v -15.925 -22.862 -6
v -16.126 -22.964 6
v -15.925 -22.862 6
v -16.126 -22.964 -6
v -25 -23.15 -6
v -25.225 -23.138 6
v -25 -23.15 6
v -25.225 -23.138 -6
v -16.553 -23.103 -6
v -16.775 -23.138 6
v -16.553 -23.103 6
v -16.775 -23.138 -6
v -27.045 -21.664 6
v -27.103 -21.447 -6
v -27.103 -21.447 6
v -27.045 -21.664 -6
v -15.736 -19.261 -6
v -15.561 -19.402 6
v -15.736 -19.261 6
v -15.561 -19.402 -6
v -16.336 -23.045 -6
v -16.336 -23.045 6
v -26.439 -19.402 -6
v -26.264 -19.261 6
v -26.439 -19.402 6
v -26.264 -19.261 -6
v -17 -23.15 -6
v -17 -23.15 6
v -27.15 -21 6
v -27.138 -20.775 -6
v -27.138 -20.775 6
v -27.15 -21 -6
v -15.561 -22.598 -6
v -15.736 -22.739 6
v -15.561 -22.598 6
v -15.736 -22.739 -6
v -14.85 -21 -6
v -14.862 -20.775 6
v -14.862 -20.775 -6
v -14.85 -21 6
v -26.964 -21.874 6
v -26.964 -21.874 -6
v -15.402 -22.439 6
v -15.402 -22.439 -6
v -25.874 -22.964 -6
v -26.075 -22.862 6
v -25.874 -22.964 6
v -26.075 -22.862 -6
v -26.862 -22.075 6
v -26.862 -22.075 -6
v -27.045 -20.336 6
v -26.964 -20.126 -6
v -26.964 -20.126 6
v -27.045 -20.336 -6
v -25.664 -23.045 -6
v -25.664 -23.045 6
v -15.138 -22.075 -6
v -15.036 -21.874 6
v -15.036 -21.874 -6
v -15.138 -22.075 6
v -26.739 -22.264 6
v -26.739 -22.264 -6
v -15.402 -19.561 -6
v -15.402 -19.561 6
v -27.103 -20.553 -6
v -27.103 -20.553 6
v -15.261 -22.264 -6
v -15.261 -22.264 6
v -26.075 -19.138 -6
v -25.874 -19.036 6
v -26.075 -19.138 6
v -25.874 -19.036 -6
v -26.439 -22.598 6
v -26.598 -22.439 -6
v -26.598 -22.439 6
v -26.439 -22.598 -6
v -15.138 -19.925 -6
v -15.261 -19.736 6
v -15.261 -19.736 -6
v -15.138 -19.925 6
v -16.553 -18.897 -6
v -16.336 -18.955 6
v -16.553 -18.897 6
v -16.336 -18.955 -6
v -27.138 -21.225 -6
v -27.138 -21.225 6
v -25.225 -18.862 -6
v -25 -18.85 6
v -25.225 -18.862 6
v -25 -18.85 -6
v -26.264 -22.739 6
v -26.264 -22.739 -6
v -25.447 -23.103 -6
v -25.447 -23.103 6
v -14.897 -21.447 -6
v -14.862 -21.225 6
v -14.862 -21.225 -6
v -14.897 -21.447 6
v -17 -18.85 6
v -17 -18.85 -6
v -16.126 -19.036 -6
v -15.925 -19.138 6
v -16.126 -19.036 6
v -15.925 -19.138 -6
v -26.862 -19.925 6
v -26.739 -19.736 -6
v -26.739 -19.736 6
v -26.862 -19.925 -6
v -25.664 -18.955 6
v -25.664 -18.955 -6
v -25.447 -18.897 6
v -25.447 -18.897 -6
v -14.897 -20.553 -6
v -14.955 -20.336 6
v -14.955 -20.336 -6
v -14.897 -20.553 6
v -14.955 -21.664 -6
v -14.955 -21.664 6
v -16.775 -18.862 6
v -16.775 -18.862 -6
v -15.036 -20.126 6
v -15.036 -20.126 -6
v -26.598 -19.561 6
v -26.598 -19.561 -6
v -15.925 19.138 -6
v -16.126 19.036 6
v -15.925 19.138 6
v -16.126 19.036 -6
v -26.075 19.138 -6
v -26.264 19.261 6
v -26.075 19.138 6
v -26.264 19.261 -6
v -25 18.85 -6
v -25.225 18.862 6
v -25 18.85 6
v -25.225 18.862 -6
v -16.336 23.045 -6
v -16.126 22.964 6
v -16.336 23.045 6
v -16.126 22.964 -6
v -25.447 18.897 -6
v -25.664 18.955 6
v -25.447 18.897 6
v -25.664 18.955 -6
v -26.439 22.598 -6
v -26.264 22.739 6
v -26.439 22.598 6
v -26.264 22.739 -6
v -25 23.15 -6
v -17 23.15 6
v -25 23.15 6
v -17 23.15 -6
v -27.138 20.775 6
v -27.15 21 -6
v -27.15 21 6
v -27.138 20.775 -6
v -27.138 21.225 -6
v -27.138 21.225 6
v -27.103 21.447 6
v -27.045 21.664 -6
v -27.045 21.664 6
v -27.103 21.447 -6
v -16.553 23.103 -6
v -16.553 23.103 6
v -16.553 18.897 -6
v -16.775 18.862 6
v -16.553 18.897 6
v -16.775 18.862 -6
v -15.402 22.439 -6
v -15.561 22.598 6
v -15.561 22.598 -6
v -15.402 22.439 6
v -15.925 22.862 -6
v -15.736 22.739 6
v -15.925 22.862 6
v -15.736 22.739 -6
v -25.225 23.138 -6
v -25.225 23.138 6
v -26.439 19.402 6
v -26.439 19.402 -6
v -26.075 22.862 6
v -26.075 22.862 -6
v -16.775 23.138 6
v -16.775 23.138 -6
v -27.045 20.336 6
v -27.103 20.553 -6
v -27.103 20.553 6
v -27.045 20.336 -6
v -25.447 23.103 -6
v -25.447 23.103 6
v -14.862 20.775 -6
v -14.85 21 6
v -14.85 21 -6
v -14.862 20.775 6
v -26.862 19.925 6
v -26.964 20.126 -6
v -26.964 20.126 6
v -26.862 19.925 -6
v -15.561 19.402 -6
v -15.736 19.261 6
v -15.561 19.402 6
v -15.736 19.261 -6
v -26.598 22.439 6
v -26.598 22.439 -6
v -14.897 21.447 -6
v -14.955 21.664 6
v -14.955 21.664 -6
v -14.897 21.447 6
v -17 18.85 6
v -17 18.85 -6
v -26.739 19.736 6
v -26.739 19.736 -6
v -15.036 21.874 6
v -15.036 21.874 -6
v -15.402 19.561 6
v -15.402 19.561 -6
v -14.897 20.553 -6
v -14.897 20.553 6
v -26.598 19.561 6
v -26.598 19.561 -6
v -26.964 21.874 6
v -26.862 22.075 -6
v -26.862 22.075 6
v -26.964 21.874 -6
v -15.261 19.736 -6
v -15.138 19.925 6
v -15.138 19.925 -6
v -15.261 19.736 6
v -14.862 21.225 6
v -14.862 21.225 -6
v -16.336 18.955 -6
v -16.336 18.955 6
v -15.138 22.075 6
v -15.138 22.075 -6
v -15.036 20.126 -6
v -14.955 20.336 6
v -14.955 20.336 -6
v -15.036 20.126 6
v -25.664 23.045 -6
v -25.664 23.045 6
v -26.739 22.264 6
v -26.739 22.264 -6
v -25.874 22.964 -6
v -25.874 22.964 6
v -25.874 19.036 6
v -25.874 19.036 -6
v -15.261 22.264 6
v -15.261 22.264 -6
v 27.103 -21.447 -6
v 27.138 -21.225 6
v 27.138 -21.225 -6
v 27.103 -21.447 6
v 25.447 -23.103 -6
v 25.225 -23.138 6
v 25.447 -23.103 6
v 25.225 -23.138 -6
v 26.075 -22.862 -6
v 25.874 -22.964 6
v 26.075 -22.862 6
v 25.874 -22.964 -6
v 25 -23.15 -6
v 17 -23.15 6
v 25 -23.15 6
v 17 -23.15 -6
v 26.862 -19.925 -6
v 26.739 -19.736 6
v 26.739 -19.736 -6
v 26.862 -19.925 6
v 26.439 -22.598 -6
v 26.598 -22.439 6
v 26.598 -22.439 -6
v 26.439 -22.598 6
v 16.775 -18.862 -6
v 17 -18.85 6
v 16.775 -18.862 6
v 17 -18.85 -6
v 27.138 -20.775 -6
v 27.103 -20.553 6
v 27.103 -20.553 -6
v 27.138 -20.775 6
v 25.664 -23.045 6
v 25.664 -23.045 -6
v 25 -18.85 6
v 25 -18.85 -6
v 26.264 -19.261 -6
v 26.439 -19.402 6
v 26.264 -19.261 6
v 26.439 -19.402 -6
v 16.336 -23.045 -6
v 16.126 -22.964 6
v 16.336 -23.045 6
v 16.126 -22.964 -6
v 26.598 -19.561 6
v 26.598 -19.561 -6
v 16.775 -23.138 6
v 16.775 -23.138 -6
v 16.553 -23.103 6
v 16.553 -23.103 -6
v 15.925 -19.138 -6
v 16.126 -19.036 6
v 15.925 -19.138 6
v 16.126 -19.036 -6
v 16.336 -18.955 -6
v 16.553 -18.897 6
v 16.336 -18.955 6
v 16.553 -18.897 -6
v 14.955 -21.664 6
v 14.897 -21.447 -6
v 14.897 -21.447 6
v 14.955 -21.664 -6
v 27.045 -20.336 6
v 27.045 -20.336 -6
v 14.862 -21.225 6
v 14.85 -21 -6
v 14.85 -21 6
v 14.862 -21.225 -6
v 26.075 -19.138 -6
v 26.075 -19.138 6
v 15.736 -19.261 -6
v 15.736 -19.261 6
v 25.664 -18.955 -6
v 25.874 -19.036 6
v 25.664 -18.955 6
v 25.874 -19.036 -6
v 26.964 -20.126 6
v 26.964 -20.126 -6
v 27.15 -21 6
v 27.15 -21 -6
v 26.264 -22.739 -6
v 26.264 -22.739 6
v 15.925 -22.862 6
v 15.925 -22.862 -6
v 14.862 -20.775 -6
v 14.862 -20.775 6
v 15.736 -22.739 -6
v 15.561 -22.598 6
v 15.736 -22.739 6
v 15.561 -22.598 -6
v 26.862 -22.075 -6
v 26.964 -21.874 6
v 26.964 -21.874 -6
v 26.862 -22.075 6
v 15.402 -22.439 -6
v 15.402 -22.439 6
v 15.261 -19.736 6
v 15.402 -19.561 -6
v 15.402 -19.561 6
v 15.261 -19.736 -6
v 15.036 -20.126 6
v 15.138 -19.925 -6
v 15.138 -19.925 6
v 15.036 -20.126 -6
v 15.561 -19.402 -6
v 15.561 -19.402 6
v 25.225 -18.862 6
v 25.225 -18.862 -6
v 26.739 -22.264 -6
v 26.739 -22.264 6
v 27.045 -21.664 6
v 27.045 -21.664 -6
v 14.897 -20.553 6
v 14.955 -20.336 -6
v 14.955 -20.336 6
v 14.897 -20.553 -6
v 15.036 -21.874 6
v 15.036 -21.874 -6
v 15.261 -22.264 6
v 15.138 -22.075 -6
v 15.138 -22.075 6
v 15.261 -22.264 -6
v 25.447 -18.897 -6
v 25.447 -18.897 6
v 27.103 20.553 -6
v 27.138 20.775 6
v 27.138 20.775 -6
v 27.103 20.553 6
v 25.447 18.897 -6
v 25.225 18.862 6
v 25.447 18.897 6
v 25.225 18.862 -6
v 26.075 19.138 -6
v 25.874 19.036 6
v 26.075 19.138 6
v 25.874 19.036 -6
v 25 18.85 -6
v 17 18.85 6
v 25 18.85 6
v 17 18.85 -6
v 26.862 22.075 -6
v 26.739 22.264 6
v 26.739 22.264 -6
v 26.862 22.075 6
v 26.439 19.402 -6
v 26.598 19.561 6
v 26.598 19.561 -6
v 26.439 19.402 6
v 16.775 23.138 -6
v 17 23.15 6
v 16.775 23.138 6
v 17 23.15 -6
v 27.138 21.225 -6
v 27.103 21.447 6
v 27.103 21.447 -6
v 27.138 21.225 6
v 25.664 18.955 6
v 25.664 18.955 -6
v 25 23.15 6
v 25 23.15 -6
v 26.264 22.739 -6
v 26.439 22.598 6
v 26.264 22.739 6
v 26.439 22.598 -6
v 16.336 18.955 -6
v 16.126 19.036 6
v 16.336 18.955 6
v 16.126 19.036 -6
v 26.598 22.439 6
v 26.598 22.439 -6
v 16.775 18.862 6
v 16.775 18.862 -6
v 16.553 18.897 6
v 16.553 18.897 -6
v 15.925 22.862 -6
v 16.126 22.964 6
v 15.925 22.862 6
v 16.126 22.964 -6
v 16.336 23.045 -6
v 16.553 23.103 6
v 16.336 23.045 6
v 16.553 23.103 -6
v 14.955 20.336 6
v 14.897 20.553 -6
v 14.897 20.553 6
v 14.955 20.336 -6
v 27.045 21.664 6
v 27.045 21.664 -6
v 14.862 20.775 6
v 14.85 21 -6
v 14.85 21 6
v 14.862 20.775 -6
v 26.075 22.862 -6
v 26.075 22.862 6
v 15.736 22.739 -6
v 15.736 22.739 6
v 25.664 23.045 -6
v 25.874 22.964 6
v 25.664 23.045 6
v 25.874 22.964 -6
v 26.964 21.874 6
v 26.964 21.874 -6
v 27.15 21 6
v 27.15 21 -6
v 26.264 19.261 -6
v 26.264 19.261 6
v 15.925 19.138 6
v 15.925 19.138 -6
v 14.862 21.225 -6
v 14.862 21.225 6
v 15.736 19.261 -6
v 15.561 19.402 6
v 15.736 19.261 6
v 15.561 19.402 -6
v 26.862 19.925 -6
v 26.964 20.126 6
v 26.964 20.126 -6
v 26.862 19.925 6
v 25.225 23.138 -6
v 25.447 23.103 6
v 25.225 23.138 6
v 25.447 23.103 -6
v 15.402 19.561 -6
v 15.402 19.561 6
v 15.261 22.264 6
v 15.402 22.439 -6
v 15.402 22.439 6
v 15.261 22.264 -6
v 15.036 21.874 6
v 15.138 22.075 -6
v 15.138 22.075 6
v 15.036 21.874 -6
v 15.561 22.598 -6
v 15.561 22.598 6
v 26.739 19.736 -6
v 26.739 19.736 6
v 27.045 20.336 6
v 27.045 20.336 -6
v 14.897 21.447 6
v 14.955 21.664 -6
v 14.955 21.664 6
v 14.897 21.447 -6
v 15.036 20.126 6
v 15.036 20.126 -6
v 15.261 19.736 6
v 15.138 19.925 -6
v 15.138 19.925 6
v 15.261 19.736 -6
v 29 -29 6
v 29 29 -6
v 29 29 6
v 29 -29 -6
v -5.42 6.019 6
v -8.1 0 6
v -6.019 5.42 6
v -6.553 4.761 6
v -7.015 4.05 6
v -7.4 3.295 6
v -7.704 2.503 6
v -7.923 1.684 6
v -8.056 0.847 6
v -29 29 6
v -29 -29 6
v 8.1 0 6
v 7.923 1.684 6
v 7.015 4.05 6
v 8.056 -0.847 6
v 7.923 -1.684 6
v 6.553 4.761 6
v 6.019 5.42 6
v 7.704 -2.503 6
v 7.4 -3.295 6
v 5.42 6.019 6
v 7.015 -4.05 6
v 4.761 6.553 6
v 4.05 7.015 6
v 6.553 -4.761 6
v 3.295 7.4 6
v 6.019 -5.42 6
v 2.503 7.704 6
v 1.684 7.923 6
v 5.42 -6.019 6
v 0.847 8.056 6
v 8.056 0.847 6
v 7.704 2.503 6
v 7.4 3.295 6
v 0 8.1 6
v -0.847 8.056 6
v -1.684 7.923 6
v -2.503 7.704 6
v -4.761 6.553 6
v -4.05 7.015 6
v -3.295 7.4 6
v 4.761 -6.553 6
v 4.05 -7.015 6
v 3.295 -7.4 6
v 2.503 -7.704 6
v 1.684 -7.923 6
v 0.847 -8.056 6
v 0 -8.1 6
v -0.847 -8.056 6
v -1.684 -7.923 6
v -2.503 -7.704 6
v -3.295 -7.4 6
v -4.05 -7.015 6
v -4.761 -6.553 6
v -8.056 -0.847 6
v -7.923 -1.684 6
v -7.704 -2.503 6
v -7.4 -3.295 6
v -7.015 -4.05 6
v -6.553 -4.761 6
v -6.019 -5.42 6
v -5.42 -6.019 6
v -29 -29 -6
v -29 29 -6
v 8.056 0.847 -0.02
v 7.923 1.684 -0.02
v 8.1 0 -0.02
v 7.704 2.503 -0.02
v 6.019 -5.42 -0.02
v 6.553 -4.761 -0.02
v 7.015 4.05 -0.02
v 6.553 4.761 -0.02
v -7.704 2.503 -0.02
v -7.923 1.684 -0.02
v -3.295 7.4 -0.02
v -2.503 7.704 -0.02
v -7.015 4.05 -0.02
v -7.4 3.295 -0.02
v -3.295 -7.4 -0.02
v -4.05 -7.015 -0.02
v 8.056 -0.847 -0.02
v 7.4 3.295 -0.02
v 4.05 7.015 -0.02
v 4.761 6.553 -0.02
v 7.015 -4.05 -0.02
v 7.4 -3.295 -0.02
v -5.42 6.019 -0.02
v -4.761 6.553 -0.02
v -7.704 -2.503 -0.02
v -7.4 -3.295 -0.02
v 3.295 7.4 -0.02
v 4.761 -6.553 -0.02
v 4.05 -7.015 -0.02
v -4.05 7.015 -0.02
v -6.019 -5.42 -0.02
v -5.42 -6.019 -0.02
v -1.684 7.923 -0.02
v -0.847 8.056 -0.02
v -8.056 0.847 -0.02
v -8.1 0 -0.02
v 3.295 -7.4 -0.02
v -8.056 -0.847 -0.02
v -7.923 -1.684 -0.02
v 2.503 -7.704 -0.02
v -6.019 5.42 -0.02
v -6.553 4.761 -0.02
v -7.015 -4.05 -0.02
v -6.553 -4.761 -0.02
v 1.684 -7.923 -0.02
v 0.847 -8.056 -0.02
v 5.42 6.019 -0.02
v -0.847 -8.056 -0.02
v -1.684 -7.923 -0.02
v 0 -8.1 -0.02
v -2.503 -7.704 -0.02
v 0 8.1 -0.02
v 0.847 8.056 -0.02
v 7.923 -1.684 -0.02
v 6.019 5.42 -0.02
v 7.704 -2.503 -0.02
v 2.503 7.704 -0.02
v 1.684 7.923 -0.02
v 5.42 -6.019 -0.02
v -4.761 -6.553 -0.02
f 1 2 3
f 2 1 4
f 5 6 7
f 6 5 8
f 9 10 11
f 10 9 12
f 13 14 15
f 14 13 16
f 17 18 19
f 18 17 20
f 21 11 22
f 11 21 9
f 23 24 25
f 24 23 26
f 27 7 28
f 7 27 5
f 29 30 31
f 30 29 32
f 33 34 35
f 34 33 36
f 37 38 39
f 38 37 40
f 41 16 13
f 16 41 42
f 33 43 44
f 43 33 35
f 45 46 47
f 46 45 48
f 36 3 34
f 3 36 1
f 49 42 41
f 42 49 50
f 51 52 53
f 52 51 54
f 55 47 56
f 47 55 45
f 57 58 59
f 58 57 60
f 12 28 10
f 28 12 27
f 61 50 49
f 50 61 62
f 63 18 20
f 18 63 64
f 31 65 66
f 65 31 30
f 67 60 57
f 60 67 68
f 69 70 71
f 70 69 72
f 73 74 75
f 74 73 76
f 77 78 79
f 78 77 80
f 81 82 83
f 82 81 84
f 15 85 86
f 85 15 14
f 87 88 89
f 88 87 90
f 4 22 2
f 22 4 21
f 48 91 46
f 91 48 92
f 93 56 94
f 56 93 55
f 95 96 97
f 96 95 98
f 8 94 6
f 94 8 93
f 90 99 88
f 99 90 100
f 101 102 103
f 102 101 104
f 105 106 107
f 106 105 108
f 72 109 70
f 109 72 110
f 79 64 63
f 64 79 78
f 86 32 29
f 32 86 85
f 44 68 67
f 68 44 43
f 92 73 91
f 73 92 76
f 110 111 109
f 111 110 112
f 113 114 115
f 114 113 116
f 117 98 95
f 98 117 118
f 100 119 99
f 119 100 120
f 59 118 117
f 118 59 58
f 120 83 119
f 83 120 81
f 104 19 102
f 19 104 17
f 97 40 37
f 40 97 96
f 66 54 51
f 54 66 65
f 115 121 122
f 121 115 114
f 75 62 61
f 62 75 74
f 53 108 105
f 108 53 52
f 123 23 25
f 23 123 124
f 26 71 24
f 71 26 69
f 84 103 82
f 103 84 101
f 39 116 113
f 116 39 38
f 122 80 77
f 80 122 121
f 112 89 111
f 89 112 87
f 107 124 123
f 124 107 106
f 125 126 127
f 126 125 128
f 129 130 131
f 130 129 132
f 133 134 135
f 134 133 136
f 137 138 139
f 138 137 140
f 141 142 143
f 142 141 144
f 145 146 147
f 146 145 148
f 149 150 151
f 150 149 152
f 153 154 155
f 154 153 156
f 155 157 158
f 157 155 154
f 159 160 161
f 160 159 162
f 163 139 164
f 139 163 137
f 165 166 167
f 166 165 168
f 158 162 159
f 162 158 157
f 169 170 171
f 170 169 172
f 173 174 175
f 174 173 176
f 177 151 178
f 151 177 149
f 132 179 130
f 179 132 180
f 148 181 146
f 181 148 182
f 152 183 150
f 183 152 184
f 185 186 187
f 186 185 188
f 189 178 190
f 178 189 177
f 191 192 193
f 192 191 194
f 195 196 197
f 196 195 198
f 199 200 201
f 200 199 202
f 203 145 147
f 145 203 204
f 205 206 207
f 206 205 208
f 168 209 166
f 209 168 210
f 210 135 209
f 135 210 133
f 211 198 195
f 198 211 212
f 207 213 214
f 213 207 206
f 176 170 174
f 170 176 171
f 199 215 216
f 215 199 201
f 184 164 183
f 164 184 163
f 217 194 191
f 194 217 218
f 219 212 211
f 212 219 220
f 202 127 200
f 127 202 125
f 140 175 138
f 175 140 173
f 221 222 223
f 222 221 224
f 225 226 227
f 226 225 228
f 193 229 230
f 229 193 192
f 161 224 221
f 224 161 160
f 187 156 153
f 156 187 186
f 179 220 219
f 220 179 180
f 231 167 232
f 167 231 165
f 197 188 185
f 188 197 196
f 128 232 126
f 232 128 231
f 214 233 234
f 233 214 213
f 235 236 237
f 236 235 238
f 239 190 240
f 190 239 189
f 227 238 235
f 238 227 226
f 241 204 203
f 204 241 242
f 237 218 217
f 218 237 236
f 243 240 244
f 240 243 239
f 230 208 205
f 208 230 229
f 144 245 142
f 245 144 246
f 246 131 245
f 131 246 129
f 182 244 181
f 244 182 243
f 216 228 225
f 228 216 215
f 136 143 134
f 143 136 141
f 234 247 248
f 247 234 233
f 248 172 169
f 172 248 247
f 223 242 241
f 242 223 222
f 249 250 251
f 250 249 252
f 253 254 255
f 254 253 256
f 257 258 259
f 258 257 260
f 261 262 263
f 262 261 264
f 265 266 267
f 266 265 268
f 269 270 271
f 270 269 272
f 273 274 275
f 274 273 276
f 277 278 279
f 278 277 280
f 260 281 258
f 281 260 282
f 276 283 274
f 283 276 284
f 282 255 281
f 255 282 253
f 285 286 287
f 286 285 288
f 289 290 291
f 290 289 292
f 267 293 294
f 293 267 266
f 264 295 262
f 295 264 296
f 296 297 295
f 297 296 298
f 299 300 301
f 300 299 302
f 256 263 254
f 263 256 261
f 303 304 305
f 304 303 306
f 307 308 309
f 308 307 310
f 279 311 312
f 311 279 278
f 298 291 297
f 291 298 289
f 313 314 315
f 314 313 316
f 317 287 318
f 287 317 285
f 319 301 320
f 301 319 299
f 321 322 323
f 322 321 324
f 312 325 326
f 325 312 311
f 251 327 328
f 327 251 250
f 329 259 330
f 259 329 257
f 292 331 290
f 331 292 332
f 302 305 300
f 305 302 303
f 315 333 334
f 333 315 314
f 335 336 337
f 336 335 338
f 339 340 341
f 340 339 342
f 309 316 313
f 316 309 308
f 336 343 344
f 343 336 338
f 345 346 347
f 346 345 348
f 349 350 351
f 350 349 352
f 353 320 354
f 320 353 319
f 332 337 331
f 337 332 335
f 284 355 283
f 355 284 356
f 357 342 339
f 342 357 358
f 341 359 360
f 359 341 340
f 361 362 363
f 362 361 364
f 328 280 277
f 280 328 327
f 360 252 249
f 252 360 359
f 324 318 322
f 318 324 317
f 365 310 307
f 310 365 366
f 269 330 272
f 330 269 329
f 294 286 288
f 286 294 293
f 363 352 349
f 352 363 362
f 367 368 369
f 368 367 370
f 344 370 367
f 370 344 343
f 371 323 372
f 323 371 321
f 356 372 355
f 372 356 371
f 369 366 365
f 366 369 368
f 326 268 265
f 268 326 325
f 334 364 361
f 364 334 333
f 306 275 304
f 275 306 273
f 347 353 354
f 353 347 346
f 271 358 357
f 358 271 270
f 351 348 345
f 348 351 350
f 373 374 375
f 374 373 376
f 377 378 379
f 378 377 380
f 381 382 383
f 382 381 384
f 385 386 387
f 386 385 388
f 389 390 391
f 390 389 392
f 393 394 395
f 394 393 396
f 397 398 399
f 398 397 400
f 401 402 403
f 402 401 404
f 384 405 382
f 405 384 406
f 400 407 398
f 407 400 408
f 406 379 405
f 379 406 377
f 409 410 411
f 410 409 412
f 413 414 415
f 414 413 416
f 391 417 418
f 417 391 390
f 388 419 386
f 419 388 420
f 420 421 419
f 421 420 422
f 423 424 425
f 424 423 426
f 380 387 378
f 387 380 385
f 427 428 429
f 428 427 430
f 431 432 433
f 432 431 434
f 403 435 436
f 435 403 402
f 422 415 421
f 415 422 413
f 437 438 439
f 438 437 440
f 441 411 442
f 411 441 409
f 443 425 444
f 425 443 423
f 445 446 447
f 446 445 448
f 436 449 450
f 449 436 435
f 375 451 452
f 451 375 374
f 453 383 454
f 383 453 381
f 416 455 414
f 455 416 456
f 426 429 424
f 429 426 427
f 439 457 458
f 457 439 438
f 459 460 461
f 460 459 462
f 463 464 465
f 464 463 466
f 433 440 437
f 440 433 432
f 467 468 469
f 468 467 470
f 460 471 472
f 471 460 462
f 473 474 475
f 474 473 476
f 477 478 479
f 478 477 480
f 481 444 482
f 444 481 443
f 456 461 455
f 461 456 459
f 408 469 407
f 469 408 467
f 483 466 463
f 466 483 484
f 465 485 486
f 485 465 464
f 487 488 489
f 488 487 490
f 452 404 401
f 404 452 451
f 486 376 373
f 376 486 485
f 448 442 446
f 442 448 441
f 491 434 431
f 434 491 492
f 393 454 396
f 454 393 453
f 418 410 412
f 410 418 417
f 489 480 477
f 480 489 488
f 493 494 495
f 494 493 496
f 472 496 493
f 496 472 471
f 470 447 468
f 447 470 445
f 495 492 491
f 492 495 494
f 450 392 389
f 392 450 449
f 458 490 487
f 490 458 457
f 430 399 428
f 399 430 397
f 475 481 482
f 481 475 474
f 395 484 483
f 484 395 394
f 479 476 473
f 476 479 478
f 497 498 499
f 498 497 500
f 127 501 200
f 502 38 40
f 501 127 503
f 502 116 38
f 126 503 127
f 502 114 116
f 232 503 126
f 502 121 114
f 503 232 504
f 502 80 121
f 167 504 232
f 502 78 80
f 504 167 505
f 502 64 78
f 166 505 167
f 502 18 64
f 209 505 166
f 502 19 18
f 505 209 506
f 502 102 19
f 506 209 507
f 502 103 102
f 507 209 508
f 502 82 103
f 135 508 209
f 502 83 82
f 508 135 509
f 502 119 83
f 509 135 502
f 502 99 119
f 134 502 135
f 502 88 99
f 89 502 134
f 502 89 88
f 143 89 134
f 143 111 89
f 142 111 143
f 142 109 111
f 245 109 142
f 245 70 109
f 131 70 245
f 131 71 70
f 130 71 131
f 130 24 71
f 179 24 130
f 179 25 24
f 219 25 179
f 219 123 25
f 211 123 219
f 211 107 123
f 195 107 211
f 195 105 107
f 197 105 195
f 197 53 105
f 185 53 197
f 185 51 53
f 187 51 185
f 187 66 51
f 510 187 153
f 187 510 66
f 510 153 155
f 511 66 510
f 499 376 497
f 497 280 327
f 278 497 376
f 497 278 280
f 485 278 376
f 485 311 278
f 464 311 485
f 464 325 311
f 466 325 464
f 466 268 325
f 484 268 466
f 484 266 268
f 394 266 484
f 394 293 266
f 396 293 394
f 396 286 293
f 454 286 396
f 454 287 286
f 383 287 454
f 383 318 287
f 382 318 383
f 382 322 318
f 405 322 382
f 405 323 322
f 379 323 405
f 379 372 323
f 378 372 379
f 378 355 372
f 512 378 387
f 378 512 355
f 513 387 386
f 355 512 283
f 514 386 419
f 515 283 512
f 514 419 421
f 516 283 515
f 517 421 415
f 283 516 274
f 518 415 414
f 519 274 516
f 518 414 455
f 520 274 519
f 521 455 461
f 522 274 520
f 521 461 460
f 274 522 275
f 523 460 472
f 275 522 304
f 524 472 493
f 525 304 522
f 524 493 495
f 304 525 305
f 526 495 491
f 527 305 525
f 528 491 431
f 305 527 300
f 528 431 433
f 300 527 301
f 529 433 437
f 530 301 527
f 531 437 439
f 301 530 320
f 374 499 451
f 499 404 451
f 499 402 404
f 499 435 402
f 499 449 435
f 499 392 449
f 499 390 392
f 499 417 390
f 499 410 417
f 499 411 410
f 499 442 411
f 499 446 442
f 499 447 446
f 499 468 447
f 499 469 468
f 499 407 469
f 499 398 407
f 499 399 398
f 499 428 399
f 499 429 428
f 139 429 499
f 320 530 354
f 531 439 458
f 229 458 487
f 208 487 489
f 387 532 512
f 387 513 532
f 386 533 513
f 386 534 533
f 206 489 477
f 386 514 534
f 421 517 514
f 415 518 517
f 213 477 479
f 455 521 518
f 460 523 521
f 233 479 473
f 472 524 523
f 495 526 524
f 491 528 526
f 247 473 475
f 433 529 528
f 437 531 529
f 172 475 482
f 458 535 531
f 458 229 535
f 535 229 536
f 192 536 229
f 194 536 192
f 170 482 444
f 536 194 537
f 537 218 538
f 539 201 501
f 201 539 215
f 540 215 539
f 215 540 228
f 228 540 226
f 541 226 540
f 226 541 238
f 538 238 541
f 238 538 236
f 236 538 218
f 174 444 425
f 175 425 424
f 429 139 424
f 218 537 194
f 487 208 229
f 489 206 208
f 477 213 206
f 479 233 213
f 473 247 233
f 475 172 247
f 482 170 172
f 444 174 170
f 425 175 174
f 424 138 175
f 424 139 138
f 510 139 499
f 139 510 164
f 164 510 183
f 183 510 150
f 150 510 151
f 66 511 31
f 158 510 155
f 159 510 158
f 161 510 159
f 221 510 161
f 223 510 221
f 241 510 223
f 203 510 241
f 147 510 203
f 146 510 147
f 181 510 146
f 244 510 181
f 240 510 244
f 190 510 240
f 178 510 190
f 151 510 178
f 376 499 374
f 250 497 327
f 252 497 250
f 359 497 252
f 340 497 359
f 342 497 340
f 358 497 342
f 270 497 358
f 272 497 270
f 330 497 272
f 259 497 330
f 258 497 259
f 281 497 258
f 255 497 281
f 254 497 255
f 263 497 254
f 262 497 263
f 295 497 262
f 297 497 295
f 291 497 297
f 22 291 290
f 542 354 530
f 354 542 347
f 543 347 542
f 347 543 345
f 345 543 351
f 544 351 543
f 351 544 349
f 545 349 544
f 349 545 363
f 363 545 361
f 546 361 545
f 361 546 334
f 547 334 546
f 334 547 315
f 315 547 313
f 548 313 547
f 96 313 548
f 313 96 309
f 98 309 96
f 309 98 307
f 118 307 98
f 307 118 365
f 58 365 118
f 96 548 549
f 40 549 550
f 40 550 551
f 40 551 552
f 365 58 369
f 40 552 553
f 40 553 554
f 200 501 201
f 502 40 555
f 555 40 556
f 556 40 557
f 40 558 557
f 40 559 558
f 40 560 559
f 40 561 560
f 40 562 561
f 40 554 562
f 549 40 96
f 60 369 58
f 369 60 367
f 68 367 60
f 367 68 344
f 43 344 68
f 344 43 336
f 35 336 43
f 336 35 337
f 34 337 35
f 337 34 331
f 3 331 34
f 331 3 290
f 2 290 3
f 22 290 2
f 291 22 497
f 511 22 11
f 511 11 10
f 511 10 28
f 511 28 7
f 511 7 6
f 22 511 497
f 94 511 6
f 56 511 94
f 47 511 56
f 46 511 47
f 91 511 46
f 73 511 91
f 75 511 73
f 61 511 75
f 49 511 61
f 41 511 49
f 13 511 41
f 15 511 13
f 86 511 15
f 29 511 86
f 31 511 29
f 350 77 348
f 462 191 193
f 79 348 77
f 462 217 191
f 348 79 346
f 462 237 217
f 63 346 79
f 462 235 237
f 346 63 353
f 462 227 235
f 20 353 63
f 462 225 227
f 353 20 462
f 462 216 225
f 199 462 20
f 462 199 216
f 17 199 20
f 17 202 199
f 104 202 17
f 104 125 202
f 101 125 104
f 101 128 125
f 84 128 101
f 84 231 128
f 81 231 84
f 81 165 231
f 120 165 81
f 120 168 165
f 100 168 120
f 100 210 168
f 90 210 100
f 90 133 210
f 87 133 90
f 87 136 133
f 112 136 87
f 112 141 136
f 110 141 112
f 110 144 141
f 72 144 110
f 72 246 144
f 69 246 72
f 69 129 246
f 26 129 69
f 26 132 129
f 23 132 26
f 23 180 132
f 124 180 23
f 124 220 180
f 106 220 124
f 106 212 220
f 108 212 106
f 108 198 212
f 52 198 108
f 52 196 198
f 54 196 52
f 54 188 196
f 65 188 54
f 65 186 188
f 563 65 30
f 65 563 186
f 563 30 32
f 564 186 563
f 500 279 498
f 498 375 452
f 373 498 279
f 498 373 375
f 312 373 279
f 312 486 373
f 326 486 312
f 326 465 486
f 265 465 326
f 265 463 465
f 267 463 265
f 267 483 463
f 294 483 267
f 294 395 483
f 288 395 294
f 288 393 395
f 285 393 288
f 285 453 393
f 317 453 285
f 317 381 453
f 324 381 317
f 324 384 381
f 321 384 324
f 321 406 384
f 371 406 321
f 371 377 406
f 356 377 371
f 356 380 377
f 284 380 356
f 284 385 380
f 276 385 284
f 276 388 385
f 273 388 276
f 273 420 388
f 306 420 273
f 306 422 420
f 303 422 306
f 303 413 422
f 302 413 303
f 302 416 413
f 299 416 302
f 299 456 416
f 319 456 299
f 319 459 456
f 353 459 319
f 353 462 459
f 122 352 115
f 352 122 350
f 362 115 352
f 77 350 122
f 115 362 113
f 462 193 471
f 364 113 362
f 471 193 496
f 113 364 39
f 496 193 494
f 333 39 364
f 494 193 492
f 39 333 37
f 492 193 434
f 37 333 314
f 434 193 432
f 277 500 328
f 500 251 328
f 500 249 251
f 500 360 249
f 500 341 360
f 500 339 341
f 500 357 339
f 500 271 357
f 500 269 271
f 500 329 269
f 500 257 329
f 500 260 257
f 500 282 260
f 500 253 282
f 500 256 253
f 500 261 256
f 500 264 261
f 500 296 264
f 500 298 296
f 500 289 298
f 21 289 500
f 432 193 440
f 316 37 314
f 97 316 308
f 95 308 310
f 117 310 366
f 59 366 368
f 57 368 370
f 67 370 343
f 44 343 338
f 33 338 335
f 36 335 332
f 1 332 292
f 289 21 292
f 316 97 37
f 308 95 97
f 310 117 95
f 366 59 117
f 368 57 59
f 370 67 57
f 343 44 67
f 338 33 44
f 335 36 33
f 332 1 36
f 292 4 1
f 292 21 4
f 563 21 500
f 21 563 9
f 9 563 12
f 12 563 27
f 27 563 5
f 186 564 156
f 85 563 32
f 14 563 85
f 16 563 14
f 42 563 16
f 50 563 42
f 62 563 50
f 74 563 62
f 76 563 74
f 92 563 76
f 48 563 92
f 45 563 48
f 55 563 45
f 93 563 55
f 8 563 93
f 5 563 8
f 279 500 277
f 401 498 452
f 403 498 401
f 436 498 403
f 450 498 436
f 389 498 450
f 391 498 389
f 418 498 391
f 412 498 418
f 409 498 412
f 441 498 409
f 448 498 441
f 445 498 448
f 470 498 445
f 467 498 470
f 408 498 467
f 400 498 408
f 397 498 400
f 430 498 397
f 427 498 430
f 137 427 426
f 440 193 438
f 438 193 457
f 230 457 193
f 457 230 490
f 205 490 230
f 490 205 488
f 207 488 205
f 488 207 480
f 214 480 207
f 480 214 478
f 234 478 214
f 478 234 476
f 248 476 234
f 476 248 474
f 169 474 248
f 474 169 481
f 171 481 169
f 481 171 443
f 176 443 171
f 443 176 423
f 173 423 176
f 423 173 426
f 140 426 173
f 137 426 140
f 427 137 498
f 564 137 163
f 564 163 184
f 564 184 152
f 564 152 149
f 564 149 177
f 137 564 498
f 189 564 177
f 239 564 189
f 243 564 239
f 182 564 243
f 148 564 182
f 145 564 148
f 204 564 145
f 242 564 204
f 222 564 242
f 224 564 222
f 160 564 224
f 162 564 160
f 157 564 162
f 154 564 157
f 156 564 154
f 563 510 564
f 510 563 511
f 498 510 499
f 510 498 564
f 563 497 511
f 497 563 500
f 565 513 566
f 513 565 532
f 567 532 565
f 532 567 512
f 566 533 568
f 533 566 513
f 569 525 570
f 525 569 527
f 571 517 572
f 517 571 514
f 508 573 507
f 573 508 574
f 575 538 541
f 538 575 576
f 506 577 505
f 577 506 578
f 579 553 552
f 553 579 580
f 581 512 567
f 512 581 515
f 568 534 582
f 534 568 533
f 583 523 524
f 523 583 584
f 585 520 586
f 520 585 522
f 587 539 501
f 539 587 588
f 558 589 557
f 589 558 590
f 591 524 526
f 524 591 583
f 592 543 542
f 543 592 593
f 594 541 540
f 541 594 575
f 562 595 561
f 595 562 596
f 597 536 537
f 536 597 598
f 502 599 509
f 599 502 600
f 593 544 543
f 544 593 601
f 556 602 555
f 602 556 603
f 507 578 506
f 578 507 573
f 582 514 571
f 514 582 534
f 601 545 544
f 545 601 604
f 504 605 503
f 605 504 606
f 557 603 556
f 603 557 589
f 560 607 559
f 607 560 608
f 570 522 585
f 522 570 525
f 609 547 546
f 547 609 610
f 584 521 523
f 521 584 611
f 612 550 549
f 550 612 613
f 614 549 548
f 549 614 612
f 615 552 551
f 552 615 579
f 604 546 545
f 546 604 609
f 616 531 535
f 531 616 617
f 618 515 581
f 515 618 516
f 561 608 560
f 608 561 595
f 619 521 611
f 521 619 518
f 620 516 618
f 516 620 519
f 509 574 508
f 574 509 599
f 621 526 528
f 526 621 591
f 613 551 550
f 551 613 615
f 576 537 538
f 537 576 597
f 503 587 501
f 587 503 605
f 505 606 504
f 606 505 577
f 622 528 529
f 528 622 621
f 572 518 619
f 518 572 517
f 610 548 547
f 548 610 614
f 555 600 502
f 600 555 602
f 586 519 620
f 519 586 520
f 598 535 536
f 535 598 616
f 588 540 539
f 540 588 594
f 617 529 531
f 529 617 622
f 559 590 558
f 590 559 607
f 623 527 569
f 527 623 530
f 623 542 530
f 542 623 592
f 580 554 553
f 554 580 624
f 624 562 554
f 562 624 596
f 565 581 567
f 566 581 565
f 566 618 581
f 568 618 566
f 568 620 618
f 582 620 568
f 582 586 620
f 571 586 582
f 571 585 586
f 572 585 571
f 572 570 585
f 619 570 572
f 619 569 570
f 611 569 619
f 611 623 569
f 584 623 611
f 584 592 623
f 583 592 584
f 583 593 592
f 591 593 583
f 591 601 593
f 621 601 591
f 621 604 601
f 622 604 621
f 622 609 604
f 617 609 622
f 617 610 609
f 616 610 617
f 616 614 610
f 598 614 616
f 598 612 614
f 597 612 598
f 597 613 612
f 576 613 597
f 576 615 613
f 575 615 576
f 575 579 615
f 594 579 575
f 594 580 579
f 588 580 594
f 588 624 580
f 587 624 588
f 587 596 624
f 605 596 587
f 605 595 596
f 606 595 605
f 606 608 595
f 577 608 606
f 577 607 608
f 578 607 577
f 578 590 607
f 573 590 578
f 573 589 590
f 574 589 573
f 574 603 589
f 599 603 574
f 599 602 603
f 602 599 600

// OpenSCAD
// 625 bearing mounting plate: flanged bearing pocket with a solid bottom web.
$fn = 60;
eps = 0.02;
plate_w = 58;
plate_h = 58;
plate_t = 12;
bearing_d = 16.2;
pocket_depth = 6;
mount_pitch = 42;
mount_d = 4.3;

module slot(x, y) {
    hull() {
        translate([x - 4, y, -plate_t / 2 - eps]) cylinder(d = mount_d, h = plate_t + 2 * eps);
        translate([x + 4, y, -plate_t / 2 - eps]) cylinder(d = mount_d, h = plate_t + 2 * eps);
    }
}

difference() {
    cube([plate_w, plate_h, plate_t], center = true);
    translate([0, 0, plate_t / 2 - pocket_depth - eps])
        cylinder(d = bearing_d, h = pocket_depth + 2 * eps);
    for (x = [-mount_pitch / 2, mount_pitch / 2], y = [-mount_pitch / 2, mount_pitch / 2]) slot(x, y);
}
